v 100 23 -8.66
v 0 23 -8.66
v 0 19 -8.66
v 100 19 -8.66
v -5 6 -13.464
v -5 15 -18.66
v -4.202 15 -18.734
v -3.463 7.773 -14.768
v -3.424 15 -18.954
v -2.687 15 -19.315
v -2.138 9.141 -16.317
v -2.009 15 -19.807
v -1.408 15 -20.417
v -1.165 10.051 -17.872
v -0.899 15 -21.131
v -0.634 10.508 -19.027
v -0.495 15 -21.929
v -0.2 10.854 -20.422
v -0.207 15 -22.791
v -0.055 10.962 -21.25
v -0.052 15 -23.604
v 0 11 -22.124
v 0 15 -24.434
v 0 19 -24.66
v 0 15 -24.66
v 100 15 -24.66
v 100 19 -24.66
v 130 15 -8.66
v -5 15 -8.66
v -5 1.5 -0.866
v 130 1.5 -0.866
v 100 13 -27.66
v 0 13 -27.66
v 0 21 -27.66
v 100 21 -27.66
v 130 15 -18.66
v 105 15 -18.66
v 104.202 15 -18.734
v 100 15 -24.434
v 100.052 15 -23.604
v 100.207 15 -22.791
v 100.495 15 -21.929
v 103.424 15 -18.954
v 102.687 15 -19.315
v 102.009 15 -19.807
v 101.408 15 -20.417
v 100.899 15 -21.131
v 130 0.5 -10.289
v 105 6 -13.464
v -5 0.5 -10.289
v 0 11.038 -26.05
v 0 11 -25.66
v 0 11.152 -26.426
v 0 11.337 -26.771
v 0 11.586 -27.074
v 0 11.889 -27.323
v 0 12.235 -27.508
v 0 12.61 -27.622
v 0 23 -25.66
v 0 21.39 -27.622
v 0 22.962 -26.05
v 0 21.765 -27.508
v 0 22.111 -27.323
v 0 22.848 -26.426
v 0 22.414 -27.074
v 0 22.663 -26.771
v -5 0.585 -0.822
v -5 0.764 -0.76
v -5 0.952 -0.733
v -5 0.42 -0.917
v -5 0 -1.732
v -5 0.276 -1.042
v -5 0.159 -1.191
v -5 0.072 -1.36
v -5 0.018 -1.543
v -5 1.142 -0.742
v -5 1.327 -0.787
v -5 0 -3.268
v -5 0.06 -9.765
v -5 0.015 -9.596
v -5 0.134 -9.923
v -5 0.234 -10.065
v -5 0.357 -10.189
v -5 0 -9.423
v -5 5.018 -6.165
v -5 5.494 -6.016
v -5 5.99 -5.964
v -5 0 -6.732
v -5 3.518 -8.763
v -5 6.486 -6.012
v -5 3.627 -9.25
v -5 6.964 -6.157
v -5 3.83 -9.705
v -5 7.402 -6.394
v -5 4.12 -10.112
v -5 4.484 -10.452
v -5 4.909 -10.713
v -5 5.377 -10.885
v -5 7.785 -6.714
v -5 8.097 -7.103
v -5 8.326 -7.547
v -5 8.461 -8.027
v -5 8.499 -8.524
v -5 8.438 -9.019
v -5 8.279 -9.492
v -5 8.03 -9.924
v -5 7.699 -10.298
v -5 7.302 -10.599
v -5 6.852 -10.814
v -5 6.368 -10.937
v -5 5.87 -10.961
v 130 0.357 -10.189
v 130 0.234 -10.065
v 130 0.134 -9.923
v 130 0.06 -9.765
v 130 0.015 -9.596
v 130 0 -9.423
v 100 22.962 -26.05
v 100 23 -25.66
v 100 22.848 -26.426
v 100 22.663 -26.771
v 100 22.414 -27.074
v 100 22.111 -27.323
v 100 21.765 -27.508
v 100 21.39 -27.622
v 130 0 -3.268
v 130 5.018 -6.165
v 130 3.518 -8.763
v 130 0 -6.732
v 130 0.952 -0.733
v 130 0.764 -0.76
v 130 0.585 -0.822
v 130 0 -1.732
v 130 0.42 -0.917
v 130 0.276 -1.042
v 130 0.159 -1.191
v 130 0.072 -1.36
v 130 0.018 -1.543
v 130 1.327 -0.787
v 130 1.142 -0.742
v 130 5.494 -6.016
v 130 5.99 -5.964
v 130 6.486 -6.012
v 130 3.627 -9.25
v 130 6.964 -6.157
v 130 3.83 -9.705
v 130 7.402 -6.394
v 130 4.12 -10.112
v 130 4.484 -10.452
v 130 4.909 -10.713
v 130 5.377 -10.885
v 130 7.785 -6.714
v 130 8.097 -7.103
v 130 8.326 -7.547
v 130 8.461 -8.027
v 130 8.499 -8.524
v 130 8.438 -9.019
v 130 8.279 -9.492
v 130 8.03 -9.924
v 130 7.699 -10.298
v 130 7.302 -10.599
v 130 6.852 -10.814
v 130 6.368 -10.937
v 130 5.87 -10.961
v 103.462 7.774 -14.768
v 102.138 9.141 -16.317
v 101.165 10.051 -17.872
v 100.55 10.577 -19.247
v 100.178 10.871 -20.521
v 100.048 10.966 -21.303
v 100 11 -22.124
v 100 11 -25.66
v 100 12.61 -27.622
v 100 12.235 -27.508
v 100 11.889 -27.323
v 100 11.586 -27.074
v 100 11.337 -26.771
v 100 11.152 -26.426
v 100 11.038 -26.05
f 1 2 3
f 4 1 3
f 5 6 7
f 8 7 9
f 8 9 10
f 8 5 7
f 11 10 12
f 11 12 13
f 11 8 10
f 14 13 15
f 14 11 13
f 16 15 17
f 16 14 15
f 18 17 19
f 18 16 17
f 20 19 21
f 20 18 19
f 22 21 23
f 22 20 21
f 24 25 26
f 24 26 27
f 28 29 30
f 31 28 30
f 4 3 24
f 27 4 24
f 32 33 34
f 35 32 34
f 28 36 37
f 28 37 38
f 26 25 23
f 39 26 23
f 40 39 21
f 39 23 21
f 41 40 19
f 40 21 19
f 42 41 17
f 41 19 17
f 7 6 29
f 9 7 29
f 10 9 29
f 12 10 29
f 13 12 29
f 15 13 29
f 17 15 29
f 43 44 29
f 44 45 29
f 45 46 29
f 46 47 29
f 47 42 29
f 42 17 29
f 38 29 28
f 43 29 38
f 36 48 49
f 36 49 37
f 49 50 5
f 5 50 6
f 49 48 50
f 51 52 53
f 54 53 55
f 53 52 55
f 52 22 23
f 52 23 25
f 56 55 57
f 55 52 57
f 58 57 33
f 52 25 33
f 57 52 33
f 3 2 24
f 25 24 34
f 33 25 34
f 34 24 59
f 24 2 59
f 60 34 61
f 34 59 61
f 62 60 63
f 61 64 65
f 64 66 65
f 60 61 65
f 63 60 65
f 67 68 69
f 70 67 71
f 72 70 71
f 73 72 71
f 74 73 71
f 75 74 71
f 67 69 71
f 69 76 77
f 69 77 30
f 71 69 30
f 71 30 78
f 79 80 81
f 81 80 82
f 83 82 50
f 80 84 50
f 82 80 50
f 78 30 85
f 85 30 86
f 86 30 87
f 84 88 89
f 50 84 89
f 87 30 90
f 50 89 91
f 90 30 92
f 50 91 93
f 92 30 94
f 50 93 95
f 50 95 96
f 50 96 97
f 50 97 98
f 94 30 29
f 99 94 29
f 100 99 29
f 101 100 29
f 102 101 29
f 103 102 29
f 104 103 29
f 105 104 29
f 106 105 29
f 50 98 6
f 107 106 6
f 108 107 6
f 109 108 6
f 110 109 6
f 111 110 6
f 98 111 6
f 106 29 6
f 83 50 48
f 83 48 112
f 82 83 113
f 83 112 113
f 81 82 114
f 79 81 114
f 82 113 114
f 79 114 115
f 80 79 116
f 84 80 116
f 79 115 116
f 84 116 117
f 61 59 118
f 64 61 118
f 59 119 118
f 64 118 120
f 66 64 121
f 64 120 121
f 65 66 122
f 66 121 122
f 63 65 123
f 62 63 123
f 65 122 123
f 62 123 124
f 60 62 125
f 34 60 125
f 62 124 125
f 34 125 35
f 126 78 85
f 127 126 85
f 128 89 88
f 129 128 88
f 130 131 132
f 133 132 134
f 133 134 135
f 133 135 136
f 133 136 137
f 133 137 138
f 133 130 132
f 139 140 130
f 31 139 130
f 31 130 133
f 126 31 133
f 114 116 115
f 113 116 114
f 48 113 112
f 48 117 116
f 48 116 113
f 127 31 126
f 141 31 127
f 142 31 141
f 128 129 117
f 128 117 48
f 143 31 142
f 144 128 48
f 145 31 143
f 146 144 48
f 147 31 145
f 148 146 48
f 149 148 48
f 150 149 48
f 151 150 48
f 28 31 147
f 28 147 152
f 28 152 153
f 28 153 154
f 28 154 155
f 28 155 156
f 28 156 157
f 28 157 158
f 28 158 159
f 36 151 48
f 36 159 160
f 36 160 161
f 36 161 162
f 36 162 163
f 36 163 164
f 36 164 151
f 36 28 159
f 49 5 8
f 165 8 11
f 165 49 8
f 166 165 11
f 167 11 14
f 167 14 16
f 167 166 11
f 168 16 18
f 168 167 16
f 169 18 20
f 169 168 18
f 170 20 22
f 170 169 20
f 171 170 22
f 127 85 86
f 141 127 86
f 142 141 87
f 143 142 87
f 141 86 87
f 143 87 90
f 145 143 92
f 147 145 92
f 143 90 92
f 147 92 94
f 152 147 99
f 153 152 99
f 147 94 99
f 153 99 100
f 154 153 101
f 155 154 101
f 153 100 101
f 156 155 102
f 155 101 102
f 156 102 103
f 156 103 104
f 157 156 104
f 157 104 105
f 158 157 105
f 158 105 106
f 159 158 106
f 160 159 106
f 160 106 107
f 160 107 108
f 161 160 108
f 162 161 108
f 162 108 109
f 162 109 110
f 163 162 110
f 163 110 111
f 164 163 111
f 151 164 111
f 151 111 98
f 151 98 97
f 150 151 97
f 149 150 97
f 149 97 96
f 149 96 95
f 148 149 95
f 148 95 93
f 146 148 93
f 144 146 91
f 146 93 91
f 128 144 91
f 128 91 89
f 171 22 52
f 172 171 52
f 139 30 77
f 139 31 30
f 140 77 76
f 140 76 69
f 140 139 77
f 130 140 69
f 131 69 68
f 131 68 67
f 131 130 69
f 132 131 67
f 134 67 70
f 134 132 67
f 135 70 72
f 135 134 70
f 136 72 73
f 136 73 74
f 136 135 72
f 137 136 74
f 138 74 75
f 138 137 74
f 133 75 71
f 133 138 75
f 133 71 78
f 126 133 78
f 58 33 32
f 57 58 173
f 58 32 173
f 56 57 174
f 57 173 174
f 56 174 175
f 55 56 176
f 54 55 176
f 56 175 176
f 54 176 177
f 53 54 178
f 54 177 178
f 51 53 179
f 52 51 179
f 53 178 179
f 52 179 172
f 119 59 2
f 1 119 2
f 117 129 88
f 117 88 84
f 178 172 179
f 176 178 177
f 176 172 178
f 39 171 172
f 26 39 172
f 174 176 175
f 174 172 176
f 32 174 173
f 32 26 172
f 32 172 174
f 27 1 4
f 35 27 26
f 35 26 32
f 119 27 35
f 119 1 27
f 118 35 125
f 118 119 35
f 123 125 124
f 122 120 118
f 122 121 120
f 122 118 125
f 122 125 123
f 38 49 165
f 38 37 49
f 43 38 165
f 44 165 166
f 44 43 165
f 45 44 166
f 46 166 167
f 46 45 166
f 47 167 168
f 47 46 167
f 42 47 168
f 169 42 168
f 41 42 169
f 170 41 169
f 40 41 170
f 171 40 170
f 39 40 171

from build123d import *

# Parameters (mm, degrees)
SKETCH2_W                = 3.0000000000000036
SKETCH2_H                = 3.9999999999999982
BOSS_EXTRUDE2_DEPTH      = 100
BOSS_EXTRUDE3_DEPTH      = 30
BOSS_EXTRUDE3_DEPTH_BACK = 105
FILLET5_R                = 10
FILLET6_R                = 5
FILLET7_R                = 2
FILLET8_R                = 1


with BuildPart() as part:
    # Sketch2 → Boss-Extrude2 (new body)
    with BuildSketch(Plane(origin=(0, 0, 0), x_dir=(0, 0, -1), z_dir=(1, 0, 0))):
        Polygon((8.660254037844407, 18.999999999999996), (24.660254037844407, 19), (27.660254037844407, 19), (27.660254037844407, 23), (8.660254037844407, 22.999999999999996), align=None)
        with Locations((26.160254037844403, 17)):
            Rectangle(SKETCH2_W, SKETCH2_H)
        Polygon((24.660254037844407, 15), (18.66025403784441, 15), (16.3508529610859, 10.999999999999996), (27.66025403784441, 11), (27.660254037844407, 15), align=None)
        Polygon((18.66025403784441, 15), (8.660254037844407, 15), (8.660254037844409, 11), (16.3508529610859, 11), align=None)
        with BuildLine():
            Line((8.660254037844407, 15.000000000000002), (0, 0))
            Line((0, 0), (3.2679491924311206, 1.4e-16))
            Line((3.2679491924311206, -8.2e-16), (6.165063509461155, 5.017949192431213))
            ThreePointArc((6.165063509461059, 5.017949192431232), (7.962900689456138, 8.449244298165432), (10.964101615137764, 6))
            ThreePointArc((10.964101615137764, 5.999999999999999), (10.334608934582356, 4.341325116876664), (8.763139720814397, 3.5179491924311193))
            Line((8.763139720814408, 3.5179491924311046), (6.732050807568877, 0))
            Line((6.732050807568877, 2.8e-16), (10.000000000000004, 4.1e-16))
            Line((10.000000000000004, -1.78e-15), (16.3508529610859, 10.999999999999996))
            Line((16.3508529610859, 11), (8.660254037844409, 11))
            Line((8.660254037844409, 11), (8.660254037844407, 15))
        make_face()
    extrude(amount=BOSS_EXTRUDE2_DEPTH)

    # Sketch3 → Boss-Extrude3 (add, two sides: drawn at the far end of the back side and taken through both)
    with BuildSketch(Plane(origin=(100, 0, 0), x_dir=(0, 0, -1), z_dir=(1, 0, 0)).offset(-BOSS_EXTRUDE3_DEPTH_BACK)):
        with BuildLine():
            Line((8.66025403784439, 15.000000000000005), (0, 0))
            Line((0, 0), (3.2679491924311215, 2.8e-16))
            Line((3.267949192431121, 0), (6.1650635094611035, 5.017949192431125))
            ThreePointArc((6.165063509461104, 5.017949192431125), (7.962900689456081, 8.449244298165421), (10.964101615137764, 6))
            ThreePointArc((10.964101615137764, 5.999999999999999), (10.334608934582363, 4.341325116876672), (8.763139720814419, 3.517949192431122))
            Line((8.763139720814419, 3.517949192431122), (6.732050807568878, 3.6e-16))
            Line((6.732050807568878, 3.6e-16), (10.000000000000002, 8.7e-16))
            Line((10.000000000000004, 0), (18.66025403784441, 15.000000000000009))
            Line((18.66025403784441, 15.000000000000009), (8.66025403784439, 15.000000000000005))
        make_face()
    extrude(amount=BOSS_EXTRUDE3_DEPTH + BOSS_EXTRUDE3_DEPTH_BACK)

    # Fillet5
    fillet5_edges = [part.edges().sort_by_distance(p)[0] for p in [
        (50, 10.999999999999998, -16.3508529610859),
    ]]
    fillet(fillet5_edges, radius=FILLET5_R)

    # Fillet6
    fillet6_edges = [part.edges().sort_by_distance(p)[0] for p in [
        (0, 10.500000000000007, -16.062177826491087),
        (100, 10.500000000000007, -16.062177826491087),
    ]]
    fillet(fillet6_edges, radius=FILLET6_R - 0.0001)  # a hair under: the kernel refuses the full size

    # Fillet7
    fillet7_edges = [part.edges().sort_by_distance(p)[0] for p in [
        (50, 23, -27.660254037844407),
        (50, 11, -27.66025403784441),
    ]]
    fillet(fillet7_edges, radius=FILLET7_R)

    # Fillet8
    fillet8_edges = [part.edges().sort_by_distance(p)[0] for p in [
        (62.5, 4.3e-16, -10.000000000000004),
        (62.5, 0, 0),
    ]]
    fillet(fillet8_edges, radius=FILLET8_R)


solid = part.part
